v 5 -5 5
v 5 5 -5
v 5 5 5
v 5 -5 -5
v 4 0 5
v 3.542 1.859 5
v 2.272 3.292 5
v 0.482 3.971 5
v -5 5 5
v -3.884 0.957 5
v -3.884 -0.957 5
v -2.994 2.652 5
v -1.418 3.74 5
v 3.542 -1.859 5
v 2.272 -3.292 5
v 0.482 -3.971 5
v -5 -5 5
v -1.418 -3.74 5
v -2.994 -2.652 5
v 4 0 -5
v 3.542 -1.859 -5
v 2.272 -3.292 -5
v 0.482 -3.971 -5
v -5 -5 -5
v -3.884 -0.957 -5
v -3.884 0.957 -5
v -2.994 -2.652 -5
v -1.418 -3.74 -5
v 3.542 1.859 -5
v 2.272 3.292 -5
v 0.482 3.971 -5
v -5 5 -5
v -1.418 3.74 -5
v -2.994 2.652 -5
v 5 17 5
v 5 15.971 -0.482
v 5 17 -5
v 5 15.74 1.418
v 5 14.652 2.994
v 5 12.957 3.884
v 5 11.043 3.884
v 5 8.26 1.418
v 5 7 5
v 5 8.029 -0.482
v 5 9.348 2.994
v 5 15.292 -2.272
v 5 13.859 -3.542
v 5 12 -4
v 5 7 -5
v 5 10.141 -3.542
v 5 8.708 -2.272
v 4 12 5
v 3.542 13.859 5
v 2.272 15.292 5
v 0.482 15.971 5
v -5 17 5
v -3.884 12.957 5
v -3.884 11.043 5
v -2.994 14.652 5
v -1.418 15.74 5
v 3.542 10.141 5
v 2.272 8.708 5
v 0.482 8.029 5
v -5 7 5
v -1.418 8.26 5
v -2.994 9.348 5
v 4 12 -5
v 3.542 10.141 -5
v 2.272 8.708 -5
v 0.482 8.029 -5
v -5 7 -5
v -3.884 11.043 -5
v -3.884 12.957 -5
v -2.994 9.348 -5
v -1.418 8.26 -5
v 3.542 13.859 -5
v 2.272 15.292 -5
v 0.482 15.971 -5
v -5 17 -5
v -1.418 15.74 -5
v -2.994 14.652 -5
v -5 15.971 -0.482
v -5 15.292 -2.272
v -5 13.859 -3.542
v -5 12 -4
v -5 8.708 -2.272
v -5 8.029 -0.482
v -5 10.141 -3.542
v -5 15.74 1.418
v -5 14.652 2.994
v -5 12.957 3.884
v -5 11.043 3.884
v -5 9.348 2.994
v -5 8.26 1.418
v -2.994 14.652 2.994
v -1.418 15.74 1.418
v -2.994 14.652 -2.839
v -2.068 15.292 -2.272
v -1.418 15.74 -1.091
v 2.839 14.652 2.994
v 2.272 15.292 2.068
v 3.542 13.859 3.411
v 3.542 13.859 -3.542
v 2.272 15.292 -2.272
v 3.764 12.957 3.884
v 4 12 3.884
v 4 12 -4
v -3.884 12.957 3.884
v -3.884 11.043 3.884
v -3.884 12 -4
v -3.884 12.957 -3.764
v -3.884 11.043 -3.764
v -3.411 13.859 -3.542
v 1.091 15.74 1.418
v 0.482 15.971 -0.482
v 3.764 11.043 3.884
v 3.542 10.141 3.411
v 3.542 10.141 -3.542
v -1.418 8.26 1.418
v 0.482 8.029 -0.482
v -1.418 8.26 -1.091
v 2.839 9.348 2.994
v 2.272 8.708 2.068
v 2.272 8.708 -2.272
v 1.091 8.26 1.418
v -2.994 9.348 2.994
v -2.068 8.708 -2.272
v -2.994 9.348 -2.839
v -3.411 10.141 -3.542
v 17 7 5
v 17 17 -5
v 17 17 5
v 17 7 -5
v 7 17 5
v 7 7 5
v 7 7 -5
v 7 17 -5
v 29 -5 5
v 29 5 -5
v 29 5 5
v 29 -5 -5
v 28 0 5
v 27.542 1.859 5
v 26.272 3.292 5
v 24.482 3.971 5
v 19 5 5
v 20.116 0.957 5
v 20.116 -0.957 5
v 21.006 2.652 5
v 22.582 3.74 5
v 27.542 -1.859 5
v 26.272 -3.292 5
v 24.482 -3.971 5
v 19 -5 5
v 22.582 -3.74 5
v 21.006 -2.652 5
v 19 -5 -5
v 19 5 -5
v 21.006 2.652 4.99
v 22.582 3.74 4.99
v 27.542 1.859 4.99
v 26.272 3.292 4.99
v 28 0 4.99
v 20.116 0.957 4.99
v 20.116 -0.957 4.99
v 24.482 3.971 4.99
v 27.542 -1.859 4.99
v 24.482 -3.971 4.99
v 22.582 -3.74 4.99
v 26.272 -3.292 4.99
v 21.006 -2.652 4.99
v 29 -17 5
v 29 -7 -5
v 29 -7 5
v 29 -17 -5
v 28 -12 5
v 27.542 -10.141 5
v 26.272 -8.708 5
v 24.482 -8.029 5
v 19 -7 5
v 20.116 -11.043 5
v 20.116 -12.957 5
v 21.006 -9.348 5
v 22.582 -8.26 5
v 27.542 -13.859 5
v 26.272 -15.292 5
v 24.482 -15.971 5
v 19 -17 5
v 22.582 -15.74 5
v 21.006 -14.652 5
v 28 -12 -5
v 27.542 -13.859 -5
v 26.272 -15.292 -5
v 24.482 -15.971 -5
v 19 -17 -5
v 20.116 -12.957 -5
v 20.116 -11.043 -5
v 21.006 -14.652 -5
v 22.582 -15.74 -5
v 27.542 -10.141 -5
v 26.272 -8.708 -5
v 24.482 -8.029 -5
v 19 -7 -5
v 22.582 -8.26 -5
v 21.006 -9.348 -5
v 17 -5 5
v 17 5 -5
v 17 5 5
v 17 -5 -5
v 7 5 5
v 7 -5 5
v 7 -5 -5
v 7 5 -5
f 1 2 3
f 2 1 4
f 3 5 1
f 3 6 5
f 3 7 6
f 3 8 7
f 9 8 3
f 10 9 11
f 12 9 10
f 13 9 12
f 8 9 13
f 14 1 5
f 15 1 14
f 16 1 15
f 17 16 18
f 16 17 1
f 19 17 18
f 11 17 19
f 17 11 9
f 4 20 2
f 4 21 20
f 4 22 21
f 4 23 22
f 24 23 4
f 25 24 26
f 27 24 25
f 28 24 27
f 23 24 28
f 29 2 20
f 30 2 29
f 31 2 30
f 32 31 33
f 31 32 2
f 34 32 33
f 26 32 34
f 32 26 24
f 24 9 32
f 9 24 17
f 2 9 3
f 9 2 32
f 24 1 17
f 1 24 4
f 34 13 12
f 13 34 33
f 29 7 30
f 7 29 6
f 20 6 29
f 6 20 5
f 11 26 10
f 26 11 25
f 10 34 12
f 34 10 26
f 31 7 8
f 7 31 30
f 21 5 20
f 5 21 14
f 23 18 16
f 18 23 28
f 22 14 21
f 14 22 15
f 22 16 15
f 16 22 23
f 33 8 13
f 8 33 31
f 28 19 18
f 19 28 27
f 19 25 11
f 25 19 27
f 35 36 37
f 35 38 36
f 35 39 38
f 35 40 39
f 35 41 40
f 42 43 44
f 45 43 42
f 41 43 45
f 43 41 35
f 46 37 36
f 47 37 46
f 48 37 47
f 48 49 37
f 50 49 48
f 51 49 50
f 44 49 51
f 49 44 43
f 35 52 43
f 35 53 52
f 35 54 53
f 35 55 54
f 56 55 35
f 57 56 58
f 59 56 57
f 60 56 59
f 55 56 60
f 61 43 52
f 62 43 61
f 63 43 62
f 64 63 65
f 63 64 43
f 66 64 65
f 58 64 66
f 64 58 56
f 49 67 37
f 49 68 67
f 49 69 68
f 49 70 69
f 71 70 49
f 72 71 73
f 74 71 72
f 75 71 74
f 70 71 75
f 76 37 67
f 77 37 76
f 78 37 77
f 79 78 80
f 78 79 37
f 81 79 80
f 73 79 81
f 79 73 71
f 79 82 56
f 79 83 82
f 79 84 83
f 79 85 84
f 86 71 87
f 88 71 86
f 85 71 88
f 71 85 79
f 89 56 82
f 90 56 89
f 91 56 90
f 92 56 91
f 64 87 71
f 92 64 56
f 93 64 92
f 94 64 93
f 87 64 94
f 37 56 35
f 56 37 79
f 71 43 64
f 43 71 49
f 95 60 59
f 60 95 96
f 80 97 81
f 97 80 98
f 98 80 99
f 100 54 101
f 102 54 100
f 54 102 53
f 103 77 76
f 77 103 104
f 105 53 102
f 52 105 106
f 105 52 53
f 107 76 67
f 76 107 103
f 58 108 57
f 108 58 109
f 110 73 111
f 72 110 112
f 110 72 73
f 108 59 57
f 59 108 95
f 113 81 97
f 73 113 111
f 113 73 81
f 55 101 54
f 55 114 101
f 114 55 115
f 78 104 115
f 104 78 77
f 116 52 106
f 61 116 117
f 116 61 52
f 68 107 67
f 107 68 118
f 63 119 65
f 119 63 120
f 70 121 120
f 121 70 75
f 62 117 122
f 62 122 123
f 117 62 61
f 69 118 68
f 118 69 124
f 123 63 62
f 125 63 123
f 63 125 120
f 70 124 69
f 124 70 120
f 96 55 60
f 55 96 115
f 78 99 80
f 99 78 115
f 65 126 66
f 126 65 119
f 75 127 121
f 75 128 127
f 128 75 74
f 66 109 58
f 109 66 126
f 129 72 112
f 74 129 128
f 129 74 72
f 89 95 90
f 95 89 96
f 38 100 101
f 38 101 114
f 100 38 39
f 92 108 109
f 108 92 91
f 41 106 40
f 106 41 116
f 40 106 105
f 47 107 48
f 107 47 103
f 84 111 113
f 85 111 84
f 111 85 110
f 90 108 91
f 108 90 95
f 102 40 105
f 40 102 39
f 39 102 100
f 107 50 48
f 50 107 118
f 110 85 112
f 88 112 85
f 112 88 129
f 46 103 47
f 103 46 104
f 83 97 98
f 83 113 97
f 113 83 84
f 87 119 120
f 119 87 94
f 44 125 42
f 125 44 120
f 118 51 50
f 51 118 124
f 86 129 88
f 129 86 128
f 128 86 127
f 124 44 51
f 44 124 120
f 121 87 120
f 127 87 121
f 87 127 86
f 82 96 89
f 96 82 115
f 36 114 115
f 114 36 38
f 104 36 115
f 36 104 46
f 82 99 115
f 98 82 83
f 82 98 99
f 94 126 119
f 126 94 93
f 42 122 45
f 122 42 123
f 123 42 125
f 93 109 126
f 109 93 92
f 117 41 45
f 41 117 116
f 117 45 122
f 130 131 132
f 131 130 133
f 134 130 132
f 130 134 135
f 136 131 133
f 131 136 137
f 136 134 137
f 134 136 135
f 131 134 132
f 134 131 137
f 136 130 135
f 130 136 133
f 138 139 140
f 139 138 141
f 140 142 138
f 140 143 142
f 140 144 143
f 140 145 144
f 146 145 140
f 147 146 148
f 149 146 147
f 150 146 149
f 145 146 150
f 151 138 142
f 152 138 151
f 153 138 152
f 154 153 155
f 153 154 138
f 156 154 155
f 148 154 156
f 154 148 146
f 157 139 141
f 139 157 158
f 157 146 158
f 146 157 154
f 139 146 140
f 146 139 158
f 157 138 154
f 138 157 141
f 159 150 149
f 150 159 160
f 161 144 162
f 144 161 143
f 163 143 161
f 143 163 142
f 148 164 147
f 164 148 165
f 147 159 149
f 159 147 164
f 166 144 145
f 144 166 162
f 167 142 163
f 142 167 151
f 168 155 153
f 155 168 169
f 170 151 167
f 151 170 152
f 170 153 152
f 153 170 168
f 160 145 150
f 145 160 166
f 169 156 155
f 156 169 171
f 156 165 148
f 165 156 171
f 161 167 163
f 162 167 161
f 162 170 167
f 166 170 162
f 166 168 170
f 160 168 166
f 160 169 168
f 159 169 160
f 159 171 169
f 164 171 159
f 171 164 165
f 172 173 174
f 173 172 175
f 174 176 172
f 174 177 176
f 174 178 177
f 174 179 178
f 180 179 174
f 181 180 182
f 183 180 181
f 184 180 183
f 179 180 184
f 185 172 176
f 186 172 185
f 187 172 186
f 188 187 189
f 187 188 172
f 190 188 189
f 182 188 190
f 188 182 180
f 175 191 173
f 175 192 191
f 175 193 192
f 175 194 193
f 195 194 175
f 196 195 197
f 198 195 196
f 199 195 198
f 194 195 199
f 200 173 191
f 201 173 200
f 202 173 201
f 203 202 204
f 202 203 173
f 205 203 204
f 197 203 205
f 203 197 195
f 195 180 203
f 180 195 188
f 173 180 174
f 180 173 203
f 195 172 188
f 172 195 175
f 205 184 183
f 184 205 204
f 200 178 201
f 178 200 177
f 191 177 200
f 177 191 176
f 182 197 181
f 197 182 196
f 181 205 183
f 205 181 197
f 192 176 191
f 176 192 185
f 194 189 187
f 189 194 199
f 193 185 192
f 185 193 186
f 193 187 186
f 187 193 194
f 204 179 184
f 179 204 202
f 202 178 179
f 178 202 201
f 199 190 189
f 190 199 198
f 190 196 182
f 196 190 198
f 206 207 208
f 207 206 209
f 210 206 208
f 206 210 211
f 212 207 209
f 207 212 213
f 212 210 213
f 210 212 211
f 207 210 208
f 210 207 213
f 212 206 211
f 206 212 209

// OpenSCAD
// A note about colors:
// fast-union clears the diff colors of unioned bodies, and it is currently
// enabled for all tests. This file has a top-level union so it's all in the
// same color (it would be colorfull with lazy-union on),
// but ./difference-color-test.scad now tests the color behaviour explicitly.

// Empty
difference();
// No children
difference() { }

// Basic
difference() {
  cube([10,10,10], center=true);
  cylinder(r=4, h=20, center=true);
}

// Two negative objects
translate([0,12,0]) difference() {
  cube([10,10,10], center=true);
  cylinder(r=4, h=11, center=true);
  rotate([0,90,0]) cylinder(r=4, h=11, center=true);
}

// Not intersecting
translate([12,12,0]) difference() {
  cube([10,10,10], center=true);
  translate([0,0,7.01]) cylinder(r=4, h=4, center=true);
}

// Barely intersecting
translate([24,0,0]) difference() {
  cube([10,10,10], center=true);
  translate([0,0,6.99]) cylinder(r=4, h=4, center=true);
}

// Subtracting something from nothing
translate([24,12,0]) difference() {
  cube([0,10,10], center=true);
  # cylinder(r=4, h=20, center=true);
}

// Non-geometry (echo) statement as first child should be ignored
translate([24,-12,0]) difference() {
  echo("difference-tests");
  cube([10,10,10], center=true);
  cylinder(r=4, h=20, center=true);
}

// Subtracting 2D from 3D
translate([12,0,0]) difference() {
  cube([10,10,10], center=true);
  circle(r=6);
}
